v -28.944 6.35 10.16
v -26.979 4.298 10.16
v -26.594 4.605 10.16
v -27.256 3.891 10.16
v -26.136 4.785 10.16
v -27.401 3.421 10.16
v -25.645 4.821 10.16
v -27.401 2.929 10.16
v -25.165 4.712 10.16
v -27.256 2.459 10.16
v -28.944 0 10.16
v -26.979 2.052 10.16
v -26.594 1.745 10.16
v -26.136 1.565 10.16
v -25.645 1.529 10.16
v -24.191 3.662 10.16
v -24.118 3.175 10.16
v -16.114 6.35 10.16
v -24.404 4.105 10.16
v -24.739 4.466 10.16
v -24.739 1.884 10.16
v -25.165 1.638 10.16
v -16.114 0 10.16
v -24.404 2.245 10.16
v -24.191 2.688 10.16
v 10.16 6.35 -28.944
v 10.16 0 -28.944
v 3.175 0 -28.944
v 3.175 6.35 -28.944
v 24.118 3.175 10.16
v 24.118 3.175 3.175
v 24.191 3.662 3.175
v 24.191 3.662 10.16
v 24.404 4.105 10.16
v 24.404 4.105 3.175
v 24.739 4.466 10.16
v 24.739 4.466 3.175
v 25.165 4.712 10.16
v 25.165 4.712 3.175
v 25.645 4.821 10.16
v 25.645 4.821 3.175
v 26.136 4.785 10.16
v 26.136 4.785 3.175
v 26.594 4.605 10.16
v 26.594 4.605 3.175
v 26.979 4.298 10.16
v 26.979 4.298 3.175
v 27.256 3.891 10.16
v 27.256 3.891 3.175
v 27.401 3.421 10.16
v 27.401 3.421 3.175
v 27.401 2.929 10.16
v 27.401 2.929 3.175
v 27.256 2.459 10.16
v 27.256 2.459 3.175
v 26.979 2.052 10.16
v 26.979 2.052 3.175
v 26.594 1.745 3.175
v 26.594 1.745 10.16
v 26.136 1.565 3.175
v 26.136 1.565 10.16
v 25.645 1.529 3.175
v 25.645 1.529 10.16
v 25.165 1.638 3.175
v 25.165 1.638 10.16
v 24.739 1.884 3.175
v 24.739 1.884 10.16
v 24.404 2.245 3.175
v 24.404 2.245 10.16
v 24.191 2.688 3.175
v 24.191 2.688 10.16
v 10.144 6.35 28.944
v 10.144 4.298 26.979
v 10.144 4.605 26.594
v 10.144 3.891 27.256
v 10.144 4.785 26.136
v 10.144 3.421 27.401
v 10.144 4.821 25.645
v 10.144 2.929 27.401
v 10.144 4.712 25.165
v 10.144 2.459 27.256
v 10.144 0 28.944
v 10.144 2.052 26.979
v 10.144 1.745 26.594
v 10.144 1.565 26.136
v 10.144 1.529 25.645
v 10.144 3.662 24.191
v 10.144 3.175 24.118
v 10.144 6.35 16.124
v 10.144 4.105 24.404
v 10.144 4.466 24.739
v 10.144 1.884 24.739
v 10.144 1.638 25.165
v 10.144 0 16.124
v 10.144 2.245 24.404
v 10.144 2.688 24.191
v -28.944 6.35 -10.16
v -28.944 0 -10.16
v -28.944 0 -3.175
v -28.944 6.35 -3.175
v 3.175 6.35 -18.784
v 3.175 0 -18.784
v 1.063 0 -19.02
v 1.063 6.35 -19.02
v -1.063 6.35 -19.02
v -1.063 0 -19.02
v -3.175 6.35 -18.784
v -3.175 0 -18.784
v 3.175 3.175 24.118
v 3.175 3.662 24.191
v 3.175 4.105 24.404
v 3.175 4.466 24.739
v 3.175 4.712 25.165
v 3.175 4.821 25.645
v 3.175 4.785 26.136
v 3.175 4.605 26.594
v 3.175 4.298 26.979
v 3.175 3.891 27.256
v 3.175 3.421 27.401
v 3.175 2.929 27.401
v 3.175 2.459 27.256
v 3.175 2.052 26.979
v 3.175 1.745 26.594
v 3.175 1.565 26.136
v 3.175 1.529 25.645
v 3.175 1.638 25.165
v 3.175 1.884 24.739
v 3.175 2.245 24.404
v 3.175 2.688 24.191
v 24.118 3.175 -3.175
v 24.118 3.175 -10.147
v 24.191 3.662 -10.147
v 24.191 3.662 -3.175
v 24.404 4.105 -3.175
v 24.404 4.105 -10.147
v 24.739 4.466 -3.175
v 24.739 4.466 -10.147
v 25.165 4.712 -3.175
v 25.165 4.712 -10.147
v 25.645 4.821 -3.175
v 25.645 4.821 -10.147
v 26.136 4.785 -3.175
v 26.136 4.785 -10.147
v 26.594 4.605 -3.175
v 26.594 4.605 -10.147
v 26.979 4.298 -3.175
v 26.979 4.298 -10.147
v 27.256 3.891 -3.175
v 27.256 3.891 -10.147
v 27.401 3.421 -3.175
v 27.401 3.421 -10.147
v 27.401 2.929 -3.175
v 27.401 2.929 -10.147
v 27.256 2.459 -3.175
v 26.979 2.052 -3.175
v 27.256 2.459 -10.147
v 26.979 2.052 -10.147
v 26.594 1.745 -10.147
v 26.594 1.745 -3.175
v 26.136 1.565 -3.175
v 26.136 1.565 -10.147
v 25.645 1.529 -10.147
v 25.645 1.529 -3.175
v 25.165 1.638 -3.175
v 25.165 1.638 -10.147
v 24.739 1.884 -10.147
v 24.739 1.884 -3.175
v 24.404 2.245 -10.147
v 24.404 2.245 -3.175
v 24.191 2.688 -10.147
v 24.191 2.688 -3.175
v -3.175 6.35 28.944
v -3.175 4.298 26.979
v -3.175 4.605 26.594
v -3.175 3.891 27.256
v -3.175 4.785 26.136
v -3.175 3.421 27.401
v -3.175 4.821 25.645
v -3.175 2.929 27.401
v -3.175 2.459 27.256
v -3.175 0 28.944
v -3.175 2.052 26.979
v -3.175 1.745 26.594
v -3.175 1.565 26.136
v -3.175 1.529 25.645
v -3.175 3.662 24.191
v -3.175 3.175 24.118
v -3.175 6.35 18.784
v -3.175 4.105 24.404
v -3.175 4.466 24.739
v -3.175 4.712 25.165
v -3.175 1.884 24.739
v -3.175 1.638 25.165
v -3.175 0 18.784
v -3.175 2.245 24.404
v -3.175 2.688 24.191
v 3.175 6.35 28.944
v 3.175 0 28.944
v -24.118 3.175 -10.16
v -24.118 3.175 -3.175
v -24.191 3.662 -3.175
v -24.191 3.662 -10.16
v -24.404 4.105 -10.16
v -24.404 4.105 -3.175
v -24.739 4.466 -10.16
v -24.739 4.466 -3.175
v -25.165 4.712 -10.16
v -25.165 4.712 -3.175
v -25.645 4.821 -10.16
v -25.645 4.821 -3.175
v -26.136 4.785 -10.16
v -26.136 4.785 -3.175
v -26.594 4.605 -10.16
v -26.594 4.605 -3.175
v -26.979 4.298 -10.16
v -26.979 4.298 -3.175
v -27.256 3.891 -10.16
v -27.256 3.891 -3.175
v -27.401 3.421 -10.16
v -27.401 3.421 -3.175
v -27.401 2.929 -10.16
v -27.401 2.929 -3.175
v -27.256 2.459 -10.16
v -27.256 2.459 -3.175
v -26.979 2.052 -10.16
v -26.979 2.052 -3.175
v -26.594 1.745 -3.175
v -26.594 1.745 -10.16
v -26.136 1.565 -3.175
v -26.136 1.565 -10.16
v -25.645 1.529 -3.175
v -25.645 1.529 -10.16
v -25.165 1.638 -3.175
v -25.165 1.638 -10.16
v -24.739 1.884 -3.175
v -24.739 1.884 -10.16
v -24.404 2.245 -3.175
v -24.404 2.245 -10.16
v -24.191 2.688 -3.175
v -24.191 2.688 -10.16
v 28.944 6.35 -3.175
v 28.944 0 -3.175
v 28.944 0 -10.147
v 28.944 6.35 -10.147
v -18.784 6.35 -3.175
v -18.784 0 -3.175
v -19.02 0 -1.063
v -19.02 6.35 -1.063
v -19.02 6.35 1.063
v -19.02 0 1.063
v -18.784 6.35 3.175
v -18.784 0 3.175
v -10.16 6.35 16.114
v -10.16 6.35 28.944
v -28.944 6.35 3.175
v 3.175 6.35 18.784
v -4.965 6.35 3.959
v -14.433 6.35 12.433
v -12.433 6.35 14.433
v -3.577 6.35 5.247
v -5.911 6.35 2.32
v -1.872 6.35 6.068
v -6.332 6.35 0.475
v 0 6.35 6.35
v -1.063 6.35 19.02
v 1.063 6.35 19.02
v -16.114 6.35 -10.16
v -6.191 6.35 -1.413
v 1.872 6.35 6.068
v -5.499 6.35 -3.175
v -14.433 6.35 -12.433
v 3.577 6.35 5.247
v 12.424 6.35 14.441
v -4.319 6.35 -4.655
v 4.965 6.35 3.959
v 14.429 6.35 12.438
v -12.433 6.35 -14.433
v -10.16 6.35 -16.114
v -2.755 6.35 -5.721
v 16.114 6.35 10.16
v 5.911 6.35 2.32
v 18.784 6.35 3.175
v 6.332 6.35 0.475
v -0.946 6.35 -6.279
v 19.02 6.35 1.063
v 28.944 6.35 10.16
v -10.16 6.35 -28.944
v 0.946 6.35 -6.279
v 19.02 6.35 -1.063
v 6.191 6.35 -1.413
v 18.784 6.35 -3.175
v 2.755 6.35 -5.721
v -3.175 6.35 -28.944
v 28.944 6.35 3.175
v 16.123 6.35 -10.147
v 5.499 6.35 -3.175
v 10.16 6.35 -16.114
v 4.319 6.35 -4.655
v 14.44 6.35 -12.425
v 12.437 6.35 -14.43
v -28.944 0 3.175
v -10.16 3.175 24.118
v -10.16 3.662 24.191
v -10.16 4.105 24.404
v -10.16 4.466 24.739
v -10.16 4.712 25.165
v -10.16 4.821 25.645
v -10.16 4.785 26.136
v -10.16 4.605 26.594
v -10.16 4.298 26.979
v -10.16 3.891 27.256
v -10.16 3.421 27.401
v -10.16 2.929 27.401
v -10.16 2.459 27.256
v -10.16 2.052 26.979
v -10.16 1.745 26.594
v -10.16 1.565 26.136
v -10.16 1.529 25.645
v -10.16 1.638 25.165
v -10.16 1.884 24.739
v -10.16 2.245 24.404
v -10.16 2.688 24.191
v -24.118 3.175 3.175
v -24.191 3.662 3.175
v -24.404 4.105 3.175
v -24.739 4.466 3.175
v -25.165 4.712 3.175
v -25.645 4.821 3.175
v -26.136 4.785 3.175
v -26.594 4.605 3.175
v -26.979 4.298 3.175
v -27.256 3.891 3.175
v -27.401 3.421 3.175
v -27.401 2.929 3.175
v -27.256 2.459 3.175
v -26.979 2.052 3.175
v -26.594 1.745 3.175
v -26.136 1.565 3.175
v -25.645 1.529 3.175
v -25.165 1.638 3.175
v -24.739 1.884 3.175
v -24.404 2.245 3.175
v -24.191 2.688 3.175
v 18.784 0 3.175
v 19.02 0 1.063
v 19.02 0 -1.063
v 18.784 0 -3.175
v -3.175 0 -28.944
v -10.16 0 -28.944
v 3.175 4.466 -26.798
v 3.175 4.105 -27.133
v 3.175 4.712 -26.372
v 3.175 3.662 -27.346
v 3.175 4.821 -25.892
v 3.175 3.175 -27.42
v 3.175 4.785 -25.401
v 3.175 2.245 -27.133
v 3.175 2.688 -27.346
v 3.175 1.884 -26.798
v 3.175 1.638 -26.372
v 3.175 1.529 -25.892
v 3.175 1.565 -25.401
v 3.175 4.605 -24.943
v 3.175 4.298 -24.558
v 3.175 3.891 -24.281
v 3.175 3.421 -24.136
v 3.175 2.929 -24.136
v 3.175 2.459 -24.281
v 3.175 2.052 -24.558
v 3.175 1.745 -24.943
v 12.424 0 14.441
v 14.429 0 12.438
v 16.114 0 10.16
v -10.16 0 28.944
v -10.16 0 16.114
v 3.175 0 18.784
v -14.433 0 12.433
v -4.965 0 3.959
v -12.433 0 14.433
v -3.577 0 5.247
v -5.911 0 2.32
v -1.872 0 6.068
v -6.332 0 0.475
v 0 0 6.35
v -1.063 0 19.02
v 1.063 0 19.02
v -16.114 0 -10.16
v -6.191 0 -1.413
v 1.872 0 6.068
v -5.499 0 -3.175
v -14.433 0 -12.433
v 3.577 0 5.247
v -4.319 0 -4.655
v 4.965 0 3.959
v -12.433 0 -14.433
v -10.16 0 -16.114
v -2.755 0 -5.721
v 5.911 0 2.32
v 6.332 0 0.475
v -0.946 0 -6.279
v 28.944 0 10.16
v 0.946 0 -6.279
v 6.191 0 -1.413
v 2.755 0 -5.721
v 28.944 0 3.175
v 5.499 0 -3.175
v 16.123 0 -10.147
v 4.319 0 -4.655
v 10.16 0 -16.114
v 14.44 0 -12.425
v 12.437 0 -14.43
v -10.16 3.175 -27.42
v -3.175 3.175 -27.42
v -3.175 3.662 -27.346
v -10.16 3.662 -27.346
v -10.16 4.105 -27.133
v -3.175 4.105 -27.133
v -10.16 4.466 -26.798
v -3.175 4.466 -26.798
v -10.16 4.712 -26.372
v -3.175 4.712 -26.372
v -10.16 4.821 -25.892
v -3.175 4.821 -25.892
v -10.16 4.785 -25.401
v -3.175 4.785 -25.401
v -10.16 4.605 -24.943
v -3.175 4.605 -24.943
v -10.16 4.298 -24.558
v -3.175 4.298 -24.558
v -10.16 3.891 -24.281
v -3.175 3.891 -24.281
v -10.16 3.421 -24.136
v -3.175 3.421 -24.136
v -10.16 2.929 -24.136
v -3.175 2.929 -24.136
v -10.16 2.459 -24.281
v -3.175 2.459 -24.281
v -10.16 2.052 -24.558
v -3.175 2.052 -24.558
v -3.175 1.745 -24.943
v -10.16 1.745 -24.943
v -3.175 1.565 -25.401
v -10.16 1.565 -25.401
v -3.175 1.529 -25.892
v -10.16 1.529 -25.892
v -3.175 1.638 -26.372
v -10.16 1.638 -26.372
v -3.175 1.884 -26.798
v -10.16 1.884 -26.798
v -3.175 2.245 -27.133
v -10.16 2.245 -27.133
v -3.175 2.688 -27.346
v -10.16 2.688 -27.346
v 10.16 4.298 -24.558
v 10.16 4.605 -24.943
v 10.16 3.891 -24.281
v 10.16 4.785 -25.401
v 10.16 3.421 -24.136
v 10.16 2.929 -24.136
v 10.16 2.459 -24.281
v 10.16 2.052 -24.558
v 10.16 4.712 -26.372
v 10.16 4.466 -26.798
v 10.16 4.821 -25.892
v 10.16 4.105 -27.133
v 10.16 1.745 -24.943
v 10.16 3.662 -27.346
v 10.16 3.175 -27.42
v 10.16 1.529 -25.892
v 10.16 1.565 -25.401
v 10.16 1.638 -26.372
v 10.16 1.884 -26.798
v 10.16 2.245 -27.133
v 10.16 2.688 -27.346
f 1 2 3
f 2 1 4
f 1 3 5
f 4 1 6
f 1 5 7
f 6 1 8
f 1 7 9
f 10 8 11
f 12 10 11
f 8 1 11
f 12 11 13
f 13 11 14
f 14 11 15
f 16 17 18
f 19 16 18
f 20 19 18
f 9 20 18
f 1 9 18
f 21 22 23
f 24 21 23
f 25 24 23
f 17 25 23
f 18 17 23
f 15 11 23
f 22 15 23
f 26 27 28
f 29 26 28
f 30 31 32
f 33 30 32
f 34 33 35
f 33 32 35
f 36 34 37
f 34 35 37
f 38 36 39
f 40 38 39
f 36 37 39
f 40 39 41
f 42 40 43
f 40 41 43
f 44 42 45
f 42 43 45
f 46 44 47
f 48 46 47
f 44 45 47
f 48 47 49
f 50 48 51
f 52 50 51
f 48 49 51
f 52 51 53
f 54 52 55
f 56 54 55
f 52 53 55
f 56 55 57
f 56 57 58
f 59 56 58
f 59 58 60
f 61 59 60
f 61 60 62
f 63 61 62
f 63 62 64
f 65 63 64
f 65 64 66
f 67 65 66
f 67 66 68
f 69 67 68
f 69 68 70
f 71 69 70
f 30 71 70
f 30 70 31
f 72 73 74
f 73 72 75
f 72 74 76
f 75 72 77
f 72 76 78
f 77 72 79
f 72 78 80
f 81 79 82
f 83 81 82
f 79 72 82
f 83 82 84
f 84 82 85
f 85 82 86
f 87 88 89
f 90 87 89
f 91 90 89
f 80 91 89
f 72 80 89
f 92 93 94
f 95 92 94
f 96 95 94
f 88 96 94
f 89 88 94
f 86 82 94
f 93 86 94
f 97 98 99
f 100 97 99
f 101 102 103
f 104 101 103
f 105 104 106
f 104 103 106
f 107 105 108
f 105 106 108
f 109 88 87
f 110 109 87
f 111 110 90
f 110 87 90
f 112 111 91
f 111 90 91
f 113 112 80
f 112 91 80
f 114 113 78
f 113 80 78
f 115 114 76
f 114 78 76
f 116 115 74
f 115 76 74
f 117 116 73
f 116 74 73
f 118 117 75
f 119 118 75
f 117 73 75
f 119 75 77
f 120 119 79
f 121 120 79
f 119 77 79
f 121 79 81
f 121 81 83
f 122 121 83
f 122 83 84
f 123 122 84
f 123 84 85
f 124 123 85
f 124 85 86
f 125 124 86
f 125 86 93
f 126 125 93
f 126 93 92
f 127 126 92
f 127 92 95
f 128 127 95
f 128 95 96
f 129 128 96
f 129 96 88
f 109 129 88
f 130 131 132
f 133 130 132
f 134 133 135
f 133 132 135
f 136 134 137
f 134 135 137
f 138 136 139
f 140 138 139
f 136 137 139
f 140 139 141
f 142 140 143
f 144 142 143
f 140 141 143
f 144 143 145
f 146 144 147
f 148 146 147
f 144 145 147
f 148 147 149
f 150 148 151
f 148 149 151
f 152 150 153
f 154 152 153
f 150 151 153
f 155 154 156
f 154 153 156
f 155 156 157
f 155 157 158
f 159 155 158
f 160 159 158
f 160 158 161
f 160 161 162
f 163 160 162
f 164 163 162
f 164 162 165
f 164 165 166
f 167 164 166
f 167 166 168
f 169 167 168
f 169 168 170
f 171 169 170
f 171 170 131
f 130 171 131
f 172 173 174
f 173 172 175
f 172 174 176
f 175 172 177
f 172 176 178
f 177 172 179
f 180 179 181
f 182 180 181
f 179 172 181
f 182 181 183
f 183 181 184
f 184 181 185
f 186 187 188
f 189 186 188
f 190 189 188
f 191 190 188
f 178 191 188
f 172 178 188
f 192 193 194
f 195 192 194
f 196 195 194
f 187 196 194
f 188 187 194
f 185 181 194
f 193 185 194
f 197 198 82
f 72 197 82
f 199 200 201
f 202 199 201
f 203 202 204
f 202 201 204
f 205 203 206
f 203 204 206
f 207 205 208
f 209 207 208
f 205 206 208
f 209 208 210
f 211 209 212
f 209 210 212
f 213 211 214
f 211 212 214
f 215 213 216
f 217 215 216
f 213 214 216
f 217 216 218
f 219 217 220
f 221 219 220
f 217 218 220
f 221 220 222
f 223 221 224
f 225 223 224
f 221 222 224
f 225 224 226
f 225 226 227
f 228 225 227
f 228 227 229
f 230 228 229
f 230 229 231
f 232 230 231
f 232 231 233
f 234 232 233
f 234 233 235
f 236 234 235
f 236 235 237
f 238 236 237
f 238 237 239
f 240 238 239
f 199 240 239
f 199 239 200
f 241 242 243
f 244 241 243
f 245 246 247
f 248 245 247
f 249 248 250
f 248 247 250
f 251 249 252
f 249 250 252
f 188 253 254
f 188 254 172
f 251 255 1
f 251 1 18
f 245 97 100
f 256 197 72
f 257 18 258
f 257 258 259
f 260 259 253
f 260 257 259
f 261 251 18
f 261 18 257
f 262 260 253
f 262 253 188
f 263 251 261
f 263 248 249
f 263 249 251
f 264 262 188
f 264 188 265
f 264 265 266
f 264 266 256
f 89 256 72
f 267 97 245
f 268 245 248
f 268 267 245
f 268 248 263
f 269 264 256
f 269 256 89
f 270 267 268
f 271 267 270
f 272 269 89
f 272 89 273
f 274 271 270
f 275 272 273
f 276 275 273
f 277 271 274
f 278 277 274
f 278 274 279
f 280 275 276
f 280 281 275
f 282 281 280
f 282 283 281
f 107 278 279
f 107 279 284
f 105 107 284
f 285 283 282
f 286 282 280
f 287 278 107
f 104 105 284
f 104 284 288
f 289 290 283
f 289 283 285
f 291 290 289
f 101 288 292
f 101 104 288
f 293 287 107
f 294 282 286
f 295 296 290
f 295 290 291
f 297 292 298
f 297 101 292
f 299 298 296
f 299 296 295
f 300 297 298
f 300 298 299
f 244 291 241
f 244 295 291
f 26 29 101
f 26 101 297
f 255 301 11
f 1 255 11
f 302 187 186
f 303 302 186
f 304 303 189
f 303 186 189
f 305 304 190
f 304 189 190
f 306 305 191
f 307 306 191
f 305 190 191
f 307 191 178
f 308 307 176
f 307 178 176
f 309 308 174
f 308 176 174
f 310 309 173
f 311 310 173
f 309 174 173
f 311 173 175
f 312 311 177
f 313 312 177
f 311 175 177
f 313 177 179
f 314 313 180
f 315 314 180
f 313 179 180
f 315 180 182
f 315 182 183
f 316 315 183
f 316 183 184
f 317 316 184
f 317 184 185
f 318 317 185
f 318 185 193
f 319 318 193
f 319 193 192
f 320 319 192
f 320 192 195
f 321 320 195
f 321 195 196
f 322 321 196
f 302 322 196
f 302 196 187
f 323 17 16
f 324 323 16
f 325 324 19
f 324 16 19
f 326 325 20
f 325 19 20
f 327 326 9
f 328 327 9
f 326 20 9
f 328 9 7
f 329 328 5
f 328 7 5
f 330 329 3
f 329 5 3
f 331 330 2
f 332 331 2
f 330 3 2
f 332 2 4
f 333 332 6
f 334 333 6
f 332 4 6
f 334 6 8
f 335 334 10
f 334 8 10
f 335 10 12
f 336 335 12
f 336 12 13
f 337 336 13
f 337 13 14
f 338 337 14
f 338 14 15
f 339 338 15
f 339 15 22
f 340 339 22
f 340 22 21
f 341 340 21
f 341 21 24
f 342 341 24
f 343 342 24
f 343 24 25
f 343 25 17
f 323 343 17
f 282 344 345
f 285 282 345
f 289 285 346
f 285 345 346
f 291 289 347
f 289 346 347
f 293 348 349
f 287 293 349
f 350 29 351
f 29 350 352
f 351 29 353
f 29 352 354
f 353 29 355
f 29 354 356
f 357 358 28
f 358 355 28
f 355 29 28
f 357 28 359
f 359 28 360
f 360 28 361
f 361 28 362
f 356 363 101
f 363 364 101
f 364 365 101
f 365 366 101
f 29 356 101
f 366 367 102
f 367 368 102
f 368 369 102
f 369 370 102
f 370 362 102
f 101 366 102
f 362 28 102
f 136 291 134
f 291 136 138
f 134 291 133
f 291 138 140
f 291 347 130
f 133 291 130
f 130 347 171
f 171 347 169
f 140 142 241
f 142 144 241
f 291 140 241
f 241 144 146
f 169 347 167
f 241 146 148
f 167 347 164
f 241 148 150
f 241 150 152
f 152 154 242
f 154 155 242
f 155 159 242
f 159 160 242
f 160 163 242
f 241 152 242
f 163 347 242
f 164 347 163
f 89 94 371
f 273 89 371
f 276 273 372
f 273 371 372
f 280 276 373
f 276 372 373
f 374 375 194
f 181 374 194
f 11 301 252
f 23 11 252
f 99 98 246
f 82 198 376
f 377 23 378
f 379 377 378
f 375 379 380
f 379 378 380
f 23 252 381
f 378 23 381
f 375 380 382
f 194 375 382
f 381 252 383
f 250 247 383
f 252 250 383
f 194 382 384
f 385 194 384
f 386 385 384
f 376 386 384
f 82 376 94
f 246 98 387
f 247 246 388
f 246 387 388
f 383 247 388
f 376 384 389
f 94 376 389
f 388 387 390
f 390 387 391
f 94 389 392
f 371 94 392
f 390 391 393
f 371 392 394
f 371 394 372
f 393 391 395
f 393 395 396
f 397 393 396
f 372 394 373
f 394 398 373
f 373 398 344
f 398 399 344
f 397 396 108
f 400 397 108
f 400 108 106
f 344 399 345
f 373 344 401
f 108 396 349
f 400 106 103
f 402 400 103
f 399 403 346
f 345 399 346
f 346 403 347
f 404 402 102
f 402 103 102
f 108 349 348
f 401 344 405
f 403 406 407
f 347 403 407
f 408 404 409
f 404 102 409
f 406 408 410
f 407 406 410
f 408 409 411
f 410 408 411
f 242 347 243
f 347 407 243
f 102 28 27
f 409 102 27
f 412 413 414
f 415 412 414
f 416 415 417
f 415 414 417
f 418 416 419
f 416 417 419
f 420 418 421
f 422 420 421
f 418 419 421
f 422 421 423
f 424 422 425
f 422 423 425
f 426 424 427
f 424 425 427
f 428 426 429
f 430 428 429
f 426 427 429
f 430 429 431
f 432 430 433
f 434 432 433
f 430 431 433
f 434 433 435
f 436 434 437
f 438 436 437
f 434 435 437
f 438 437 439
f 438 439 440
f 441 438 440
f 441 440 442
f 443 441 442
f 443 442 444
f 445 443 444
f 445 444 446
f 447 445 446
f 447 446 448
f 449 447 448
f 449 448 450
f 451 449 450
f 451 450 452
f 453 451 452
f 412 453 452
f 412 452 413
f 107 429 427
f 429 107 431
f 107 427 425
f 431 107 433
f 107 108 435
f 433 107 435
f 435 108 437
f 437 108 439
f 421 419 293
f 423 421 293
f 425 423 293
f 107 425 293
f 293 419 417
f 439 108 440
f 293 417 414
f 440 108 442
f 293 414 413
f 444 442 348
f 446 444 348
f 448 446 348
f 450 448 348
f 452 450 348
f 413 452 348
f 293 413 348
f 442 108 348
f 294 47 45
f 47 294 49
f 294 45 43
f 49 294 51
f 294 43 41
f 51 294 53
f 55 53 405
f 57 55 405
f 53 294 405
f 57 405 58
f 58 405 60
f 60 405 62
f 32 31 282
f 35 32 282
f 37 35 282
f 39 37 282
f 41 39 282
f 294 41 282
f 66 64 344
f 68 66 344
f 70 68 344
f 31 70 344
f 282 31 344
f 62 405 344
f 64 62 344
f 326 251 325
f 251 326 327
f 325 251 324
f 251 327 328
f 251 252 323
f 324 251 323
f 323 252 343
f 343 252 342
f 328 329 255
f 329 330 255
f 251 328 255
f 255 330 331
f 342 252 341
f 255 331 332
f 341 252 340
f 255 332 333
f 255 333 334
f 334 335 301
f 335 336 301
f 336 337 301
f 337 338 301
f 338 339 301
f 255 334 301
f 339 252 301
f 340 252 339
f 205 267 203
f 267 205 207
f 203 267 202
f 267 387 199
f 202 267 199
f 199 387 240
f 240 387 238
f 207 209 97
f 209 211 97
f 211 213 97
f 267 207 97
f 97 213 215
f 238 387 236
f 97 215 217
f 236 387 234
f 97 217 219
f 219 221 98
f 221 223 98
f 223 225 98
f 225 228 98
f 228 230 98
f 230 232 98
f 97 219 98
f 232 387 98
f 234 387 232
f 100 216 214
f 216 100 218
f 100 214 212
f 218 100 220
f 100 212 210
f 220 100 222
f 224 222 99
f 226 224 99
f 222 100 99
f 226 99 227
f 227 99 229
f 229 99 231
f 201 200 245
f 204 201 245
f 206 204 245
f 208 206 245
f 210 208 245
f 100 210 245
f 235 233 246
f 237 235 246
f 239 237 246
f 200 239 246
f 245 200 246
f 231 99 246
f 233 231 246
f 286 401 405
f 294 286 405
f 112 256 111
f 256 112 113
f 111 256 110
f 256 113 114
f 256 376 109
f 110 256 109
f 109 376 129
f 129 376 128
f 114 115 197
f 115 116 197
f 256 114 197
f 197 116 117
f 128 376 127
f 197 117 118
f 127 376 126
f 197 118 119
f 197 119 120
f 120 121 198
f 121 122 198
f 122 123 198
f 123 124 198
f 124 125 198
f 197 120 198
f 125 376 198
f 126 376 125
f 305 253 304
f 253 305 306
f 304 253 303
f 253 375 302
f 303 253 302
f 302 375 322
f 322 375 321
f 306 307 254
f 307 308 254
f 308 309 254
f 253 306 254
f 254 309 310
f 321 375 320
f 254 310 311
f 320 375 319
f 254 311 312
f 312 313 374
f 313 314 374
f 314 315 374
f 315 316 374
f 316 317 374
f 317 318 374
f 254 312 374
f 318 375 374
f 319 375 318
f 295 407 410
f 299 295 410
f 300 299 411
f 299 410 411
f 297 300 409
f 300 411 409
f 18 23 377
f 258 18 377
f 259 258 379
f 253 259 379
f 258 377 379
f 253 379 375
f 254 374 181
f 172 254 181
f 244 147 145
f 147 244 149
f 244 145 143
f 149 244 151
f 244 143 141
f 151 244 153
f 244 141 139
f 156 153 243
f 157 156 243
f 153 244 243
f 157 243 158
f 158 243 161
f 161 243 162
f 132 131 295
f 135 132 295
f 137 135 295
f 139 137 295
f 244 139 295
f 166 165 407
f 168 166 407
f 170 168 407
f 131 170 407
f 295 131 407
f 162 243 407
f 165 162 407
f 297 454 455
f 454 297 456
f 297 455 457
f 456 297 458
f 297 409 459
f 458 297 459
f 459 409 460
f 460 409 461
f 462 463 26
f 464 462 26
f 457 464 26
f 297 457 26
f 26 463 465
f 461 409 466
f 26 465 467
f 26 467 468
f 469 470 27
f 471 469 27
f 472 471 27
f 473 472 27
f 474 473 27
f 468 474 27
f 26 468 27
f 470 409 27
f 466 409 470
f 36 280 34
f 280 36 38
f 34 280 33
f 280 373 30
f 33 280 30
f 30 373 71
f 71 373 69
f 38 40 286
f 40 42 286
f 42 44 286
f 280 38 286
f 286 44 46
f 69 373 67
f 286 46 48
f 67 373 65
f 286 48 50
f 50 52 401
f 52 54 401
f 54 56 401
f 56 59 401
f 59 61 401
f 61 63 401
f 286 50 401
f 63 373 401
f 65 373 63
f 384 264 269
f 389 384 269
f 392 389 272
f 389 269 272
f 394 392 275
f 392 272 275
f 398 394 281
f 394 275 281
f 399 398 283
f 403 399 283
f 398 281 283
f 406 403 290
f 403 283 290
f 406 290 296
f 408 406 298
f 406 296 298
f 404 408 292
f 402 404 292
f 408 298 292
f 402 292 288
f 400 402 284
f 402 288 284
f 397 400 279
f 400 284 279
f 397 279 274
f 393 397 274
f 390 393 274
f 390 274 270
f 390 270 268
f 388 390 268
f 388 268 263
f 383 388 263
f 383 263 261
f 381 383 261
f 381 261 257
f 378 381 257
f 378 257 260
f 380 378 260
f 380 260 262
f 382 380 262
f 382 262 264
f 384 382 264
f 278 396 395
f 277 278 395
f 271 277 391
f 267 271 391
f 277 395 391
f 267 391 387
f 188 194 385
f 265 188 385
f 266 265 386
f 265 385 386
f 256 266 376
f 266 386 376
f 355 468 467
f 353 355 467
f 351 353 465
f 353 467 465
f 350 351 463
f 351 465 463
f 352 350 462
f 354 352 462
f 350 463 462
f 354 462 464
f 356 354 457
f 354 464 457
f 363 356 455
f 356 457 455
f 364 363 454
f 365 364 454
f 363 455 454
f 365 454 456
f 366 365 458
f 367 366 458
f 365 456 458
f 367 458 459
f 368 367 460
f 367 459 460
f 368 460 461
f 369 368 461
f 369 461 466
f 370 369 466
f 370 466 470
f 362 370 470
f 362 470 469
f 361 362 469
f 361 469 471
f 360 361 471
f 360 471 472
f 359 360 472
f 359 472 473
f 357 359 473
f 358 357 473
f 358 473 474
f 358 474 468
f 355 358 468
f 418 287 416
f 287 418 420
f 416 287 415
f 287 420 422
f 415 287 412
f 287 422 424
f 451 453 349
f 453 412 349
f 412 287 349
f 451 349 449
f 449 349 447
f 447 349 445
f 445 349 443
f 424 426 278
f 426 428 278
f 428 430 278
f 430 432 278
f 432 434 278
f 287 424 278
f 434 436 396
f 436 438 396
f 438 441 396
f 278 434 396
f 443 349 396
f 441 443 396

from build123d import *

# Parameters (mm, degrees)
BOSS_EXTRUDE1_DEPTH = 6.35
SKETCH2_R           = 1.651
CUT_EXTRUDE1_DEPTH  = 23.368
SKETCH3_R           = 1.651
CUT_EXTRUDE2_DEPTH  = 23.368
SKETCH4_R           = 1.651
CUT_EXTRUDE3_DEPTH  = 23.368
SKETCH5_R           = 1.651
CUT_EXTRUDE4_DEPTH  = 23.368
SKETCH6_R           = 6.35
CUT_EXTRUDE5_DEPTH  = 14.3002


with BuildPart() as part:
    # Sketch1 → Boss-Extrude1 (new body)
    with BuildSketch(Plane(origin=(0, 0, 0), x_dir=(1, 0, 0), z_dir=(0, 1, 0))):
        with BuildLine():
            Line((-3.175, 18.783553311), (-3.175, 28.943553311))
            Line((-3.175, 28.943553311), (-10.16, 28.943553311))
            Line((-10.16, 28.943553311), (-10.16, 16.114493476))
            ThreePointArc((-10.16, 16.114493476), (-13.470384182, 13.470384182), (-16.114493476, 10.16))
            Line((-16.114493476, 10.16), (-28.943553311, 10.16))
            Line((-28.943553311, 10.16), (-28.943553311, 3.175))
            Line((-28.943553311, 3.175), (-18.783553311, 3.175))
            ThreePointArc((-18.783553311, 3.175), (-19.05, 0), (-18.783553311, -3.175))
            Line((-18.783553311, -3.175), (-28.943553311, -3.175))
            Line((-28.943553311, -3.175), (-28.943553311, -10.16))
            Line((-28.943553311, -10.16), (-16.114493476, -10.16))
            ThreePointArc((-16.114493476, -10.16), (-13.470384182, -13.470384182), (-10.16, -16.114493476))
            Line((-10.16, -16.114493476), (-10.16, -28.943553311))
            Line((-10.16, -28.943553311), (-3.175, -28.943553311))
            Line((-3.175, -28.943553311), (-3.175, -18.783553311))
            ThreePointArc((-3.175, -18.783553311), (0, -19.05), (3.175, -18.783553311))
            Line((3.175, -18.783553311), (3.175, -28.943553311))
            Line((3.175, -28.943553311), (10.144252899, -28.943553311))
            Line((10.144252899, -28.943553311), (10.144252899, -16.124411094))
            ThreePointArc((10.144252899, -16.124411094), (13.463802963, -13.476962186), (16.114493476, -10.16))
            Line((16.114493476, -10.16), (28.943553311, -10.16))
            Line((28.943553311, -10.16), (28.943553311, -3.175))
            Line((28.943553311, -3.175), (18.783553311, -3.175))
            ThreePointArc((18.783553311, -3.175), (19.05, 0), (18.783553311, 3.175))
            Line((18.783553311, 3.175), (28.943553311, 3.175))
            Line((28.943553311, 3.175), (28.943553311, 10.146623982))
            Line((28.943553311, 10.146623982), (16.122919145, 10.146623982))
            ThreePointArc((16.122919145, 10.146623982), (13.475972183, 13.464793861), (10.16, 16.114493476))
            Line((10.16, 16.114493476), (10.16, 28.943553311))
            Line((10.16, 28.943553311), (3.175, 28.943553311))
            Line((3.175, 28.943553311), (3.175, 18.783553311))
            ThreePointArc((3.175, 18.783553311), (0, 19.05), (-3.175, 18.783553311))
        make_face()
    extrude(amount=BOSS_EXTRUDE1_DEPTH)

    # Sketch2 → Cut-Extrude1 (cut)
    with BuildSketch(Plane(origin=(10.16, 0, 0), x_dir=(0, 0, -1), z_dir=(1, 0, 0))):
        with Locations((25.768553311, 3.175)):
            Circle(SKETCH2_R)
    extrude(amount=-CUT_EXTRUDE1_DEPTH, mode=Mode.SUBTRACT)

    # Sketch3 → Cut-Extrude2 (cut)
    with BuildSketch(Plane(origin=(0, 0, -10.146623982), x_dir=(-1, 0, 0), z_dir=(0, 0, -1))):
        with Locations((-25.768553311, 3.175)):
            Circle(SKETCH3_R)
    extrude(amount=-CUT_EXTRUDE2_DEPTH, mode=Mode.SUBTRACT)

    # Sketch4 → Cut-Extrude3 (cut)
    with BuildSketch(Plane(origin=(10.144252899, 0, 0), x_dir=(0, 0, -1), z_dir=(1, 0, 0))):
        with Locations((-25.768553311, 3.175)):
            Circle(SKETCH4_R)
    extrude(amount=-CUT_EXTRUDE3_DEPTH, mode=Mode.SUBTRACT)

    # Sketch5 → Cut-Extrude4 (cut)
    with BuildSketch(Plane.XY.offset(10.16)):
        with Locations((-25.768553311, 3.175)):
            Circle(SKETCH5_R)
    extrude(amount=-CUT_EXTRUDE4_DEPTH, mode=Mode.SUBTRACT)

    # Sketch6 → Cut-Extrude5 (cut)
    with BuildSketch(Plane(origin=(0, 6.35, 0), x_dir=(1, 0, 0), z_dir=(0, 1, 0))):
        with Locations(Location((0, 0, 0), (0, 0, 270))):
            Circle(SKETCH6_R)
    extrude(amount=-CUT_EXTRUDE5_DEPTH, mode=Mode.SUBTRACT)


solid = part.part
